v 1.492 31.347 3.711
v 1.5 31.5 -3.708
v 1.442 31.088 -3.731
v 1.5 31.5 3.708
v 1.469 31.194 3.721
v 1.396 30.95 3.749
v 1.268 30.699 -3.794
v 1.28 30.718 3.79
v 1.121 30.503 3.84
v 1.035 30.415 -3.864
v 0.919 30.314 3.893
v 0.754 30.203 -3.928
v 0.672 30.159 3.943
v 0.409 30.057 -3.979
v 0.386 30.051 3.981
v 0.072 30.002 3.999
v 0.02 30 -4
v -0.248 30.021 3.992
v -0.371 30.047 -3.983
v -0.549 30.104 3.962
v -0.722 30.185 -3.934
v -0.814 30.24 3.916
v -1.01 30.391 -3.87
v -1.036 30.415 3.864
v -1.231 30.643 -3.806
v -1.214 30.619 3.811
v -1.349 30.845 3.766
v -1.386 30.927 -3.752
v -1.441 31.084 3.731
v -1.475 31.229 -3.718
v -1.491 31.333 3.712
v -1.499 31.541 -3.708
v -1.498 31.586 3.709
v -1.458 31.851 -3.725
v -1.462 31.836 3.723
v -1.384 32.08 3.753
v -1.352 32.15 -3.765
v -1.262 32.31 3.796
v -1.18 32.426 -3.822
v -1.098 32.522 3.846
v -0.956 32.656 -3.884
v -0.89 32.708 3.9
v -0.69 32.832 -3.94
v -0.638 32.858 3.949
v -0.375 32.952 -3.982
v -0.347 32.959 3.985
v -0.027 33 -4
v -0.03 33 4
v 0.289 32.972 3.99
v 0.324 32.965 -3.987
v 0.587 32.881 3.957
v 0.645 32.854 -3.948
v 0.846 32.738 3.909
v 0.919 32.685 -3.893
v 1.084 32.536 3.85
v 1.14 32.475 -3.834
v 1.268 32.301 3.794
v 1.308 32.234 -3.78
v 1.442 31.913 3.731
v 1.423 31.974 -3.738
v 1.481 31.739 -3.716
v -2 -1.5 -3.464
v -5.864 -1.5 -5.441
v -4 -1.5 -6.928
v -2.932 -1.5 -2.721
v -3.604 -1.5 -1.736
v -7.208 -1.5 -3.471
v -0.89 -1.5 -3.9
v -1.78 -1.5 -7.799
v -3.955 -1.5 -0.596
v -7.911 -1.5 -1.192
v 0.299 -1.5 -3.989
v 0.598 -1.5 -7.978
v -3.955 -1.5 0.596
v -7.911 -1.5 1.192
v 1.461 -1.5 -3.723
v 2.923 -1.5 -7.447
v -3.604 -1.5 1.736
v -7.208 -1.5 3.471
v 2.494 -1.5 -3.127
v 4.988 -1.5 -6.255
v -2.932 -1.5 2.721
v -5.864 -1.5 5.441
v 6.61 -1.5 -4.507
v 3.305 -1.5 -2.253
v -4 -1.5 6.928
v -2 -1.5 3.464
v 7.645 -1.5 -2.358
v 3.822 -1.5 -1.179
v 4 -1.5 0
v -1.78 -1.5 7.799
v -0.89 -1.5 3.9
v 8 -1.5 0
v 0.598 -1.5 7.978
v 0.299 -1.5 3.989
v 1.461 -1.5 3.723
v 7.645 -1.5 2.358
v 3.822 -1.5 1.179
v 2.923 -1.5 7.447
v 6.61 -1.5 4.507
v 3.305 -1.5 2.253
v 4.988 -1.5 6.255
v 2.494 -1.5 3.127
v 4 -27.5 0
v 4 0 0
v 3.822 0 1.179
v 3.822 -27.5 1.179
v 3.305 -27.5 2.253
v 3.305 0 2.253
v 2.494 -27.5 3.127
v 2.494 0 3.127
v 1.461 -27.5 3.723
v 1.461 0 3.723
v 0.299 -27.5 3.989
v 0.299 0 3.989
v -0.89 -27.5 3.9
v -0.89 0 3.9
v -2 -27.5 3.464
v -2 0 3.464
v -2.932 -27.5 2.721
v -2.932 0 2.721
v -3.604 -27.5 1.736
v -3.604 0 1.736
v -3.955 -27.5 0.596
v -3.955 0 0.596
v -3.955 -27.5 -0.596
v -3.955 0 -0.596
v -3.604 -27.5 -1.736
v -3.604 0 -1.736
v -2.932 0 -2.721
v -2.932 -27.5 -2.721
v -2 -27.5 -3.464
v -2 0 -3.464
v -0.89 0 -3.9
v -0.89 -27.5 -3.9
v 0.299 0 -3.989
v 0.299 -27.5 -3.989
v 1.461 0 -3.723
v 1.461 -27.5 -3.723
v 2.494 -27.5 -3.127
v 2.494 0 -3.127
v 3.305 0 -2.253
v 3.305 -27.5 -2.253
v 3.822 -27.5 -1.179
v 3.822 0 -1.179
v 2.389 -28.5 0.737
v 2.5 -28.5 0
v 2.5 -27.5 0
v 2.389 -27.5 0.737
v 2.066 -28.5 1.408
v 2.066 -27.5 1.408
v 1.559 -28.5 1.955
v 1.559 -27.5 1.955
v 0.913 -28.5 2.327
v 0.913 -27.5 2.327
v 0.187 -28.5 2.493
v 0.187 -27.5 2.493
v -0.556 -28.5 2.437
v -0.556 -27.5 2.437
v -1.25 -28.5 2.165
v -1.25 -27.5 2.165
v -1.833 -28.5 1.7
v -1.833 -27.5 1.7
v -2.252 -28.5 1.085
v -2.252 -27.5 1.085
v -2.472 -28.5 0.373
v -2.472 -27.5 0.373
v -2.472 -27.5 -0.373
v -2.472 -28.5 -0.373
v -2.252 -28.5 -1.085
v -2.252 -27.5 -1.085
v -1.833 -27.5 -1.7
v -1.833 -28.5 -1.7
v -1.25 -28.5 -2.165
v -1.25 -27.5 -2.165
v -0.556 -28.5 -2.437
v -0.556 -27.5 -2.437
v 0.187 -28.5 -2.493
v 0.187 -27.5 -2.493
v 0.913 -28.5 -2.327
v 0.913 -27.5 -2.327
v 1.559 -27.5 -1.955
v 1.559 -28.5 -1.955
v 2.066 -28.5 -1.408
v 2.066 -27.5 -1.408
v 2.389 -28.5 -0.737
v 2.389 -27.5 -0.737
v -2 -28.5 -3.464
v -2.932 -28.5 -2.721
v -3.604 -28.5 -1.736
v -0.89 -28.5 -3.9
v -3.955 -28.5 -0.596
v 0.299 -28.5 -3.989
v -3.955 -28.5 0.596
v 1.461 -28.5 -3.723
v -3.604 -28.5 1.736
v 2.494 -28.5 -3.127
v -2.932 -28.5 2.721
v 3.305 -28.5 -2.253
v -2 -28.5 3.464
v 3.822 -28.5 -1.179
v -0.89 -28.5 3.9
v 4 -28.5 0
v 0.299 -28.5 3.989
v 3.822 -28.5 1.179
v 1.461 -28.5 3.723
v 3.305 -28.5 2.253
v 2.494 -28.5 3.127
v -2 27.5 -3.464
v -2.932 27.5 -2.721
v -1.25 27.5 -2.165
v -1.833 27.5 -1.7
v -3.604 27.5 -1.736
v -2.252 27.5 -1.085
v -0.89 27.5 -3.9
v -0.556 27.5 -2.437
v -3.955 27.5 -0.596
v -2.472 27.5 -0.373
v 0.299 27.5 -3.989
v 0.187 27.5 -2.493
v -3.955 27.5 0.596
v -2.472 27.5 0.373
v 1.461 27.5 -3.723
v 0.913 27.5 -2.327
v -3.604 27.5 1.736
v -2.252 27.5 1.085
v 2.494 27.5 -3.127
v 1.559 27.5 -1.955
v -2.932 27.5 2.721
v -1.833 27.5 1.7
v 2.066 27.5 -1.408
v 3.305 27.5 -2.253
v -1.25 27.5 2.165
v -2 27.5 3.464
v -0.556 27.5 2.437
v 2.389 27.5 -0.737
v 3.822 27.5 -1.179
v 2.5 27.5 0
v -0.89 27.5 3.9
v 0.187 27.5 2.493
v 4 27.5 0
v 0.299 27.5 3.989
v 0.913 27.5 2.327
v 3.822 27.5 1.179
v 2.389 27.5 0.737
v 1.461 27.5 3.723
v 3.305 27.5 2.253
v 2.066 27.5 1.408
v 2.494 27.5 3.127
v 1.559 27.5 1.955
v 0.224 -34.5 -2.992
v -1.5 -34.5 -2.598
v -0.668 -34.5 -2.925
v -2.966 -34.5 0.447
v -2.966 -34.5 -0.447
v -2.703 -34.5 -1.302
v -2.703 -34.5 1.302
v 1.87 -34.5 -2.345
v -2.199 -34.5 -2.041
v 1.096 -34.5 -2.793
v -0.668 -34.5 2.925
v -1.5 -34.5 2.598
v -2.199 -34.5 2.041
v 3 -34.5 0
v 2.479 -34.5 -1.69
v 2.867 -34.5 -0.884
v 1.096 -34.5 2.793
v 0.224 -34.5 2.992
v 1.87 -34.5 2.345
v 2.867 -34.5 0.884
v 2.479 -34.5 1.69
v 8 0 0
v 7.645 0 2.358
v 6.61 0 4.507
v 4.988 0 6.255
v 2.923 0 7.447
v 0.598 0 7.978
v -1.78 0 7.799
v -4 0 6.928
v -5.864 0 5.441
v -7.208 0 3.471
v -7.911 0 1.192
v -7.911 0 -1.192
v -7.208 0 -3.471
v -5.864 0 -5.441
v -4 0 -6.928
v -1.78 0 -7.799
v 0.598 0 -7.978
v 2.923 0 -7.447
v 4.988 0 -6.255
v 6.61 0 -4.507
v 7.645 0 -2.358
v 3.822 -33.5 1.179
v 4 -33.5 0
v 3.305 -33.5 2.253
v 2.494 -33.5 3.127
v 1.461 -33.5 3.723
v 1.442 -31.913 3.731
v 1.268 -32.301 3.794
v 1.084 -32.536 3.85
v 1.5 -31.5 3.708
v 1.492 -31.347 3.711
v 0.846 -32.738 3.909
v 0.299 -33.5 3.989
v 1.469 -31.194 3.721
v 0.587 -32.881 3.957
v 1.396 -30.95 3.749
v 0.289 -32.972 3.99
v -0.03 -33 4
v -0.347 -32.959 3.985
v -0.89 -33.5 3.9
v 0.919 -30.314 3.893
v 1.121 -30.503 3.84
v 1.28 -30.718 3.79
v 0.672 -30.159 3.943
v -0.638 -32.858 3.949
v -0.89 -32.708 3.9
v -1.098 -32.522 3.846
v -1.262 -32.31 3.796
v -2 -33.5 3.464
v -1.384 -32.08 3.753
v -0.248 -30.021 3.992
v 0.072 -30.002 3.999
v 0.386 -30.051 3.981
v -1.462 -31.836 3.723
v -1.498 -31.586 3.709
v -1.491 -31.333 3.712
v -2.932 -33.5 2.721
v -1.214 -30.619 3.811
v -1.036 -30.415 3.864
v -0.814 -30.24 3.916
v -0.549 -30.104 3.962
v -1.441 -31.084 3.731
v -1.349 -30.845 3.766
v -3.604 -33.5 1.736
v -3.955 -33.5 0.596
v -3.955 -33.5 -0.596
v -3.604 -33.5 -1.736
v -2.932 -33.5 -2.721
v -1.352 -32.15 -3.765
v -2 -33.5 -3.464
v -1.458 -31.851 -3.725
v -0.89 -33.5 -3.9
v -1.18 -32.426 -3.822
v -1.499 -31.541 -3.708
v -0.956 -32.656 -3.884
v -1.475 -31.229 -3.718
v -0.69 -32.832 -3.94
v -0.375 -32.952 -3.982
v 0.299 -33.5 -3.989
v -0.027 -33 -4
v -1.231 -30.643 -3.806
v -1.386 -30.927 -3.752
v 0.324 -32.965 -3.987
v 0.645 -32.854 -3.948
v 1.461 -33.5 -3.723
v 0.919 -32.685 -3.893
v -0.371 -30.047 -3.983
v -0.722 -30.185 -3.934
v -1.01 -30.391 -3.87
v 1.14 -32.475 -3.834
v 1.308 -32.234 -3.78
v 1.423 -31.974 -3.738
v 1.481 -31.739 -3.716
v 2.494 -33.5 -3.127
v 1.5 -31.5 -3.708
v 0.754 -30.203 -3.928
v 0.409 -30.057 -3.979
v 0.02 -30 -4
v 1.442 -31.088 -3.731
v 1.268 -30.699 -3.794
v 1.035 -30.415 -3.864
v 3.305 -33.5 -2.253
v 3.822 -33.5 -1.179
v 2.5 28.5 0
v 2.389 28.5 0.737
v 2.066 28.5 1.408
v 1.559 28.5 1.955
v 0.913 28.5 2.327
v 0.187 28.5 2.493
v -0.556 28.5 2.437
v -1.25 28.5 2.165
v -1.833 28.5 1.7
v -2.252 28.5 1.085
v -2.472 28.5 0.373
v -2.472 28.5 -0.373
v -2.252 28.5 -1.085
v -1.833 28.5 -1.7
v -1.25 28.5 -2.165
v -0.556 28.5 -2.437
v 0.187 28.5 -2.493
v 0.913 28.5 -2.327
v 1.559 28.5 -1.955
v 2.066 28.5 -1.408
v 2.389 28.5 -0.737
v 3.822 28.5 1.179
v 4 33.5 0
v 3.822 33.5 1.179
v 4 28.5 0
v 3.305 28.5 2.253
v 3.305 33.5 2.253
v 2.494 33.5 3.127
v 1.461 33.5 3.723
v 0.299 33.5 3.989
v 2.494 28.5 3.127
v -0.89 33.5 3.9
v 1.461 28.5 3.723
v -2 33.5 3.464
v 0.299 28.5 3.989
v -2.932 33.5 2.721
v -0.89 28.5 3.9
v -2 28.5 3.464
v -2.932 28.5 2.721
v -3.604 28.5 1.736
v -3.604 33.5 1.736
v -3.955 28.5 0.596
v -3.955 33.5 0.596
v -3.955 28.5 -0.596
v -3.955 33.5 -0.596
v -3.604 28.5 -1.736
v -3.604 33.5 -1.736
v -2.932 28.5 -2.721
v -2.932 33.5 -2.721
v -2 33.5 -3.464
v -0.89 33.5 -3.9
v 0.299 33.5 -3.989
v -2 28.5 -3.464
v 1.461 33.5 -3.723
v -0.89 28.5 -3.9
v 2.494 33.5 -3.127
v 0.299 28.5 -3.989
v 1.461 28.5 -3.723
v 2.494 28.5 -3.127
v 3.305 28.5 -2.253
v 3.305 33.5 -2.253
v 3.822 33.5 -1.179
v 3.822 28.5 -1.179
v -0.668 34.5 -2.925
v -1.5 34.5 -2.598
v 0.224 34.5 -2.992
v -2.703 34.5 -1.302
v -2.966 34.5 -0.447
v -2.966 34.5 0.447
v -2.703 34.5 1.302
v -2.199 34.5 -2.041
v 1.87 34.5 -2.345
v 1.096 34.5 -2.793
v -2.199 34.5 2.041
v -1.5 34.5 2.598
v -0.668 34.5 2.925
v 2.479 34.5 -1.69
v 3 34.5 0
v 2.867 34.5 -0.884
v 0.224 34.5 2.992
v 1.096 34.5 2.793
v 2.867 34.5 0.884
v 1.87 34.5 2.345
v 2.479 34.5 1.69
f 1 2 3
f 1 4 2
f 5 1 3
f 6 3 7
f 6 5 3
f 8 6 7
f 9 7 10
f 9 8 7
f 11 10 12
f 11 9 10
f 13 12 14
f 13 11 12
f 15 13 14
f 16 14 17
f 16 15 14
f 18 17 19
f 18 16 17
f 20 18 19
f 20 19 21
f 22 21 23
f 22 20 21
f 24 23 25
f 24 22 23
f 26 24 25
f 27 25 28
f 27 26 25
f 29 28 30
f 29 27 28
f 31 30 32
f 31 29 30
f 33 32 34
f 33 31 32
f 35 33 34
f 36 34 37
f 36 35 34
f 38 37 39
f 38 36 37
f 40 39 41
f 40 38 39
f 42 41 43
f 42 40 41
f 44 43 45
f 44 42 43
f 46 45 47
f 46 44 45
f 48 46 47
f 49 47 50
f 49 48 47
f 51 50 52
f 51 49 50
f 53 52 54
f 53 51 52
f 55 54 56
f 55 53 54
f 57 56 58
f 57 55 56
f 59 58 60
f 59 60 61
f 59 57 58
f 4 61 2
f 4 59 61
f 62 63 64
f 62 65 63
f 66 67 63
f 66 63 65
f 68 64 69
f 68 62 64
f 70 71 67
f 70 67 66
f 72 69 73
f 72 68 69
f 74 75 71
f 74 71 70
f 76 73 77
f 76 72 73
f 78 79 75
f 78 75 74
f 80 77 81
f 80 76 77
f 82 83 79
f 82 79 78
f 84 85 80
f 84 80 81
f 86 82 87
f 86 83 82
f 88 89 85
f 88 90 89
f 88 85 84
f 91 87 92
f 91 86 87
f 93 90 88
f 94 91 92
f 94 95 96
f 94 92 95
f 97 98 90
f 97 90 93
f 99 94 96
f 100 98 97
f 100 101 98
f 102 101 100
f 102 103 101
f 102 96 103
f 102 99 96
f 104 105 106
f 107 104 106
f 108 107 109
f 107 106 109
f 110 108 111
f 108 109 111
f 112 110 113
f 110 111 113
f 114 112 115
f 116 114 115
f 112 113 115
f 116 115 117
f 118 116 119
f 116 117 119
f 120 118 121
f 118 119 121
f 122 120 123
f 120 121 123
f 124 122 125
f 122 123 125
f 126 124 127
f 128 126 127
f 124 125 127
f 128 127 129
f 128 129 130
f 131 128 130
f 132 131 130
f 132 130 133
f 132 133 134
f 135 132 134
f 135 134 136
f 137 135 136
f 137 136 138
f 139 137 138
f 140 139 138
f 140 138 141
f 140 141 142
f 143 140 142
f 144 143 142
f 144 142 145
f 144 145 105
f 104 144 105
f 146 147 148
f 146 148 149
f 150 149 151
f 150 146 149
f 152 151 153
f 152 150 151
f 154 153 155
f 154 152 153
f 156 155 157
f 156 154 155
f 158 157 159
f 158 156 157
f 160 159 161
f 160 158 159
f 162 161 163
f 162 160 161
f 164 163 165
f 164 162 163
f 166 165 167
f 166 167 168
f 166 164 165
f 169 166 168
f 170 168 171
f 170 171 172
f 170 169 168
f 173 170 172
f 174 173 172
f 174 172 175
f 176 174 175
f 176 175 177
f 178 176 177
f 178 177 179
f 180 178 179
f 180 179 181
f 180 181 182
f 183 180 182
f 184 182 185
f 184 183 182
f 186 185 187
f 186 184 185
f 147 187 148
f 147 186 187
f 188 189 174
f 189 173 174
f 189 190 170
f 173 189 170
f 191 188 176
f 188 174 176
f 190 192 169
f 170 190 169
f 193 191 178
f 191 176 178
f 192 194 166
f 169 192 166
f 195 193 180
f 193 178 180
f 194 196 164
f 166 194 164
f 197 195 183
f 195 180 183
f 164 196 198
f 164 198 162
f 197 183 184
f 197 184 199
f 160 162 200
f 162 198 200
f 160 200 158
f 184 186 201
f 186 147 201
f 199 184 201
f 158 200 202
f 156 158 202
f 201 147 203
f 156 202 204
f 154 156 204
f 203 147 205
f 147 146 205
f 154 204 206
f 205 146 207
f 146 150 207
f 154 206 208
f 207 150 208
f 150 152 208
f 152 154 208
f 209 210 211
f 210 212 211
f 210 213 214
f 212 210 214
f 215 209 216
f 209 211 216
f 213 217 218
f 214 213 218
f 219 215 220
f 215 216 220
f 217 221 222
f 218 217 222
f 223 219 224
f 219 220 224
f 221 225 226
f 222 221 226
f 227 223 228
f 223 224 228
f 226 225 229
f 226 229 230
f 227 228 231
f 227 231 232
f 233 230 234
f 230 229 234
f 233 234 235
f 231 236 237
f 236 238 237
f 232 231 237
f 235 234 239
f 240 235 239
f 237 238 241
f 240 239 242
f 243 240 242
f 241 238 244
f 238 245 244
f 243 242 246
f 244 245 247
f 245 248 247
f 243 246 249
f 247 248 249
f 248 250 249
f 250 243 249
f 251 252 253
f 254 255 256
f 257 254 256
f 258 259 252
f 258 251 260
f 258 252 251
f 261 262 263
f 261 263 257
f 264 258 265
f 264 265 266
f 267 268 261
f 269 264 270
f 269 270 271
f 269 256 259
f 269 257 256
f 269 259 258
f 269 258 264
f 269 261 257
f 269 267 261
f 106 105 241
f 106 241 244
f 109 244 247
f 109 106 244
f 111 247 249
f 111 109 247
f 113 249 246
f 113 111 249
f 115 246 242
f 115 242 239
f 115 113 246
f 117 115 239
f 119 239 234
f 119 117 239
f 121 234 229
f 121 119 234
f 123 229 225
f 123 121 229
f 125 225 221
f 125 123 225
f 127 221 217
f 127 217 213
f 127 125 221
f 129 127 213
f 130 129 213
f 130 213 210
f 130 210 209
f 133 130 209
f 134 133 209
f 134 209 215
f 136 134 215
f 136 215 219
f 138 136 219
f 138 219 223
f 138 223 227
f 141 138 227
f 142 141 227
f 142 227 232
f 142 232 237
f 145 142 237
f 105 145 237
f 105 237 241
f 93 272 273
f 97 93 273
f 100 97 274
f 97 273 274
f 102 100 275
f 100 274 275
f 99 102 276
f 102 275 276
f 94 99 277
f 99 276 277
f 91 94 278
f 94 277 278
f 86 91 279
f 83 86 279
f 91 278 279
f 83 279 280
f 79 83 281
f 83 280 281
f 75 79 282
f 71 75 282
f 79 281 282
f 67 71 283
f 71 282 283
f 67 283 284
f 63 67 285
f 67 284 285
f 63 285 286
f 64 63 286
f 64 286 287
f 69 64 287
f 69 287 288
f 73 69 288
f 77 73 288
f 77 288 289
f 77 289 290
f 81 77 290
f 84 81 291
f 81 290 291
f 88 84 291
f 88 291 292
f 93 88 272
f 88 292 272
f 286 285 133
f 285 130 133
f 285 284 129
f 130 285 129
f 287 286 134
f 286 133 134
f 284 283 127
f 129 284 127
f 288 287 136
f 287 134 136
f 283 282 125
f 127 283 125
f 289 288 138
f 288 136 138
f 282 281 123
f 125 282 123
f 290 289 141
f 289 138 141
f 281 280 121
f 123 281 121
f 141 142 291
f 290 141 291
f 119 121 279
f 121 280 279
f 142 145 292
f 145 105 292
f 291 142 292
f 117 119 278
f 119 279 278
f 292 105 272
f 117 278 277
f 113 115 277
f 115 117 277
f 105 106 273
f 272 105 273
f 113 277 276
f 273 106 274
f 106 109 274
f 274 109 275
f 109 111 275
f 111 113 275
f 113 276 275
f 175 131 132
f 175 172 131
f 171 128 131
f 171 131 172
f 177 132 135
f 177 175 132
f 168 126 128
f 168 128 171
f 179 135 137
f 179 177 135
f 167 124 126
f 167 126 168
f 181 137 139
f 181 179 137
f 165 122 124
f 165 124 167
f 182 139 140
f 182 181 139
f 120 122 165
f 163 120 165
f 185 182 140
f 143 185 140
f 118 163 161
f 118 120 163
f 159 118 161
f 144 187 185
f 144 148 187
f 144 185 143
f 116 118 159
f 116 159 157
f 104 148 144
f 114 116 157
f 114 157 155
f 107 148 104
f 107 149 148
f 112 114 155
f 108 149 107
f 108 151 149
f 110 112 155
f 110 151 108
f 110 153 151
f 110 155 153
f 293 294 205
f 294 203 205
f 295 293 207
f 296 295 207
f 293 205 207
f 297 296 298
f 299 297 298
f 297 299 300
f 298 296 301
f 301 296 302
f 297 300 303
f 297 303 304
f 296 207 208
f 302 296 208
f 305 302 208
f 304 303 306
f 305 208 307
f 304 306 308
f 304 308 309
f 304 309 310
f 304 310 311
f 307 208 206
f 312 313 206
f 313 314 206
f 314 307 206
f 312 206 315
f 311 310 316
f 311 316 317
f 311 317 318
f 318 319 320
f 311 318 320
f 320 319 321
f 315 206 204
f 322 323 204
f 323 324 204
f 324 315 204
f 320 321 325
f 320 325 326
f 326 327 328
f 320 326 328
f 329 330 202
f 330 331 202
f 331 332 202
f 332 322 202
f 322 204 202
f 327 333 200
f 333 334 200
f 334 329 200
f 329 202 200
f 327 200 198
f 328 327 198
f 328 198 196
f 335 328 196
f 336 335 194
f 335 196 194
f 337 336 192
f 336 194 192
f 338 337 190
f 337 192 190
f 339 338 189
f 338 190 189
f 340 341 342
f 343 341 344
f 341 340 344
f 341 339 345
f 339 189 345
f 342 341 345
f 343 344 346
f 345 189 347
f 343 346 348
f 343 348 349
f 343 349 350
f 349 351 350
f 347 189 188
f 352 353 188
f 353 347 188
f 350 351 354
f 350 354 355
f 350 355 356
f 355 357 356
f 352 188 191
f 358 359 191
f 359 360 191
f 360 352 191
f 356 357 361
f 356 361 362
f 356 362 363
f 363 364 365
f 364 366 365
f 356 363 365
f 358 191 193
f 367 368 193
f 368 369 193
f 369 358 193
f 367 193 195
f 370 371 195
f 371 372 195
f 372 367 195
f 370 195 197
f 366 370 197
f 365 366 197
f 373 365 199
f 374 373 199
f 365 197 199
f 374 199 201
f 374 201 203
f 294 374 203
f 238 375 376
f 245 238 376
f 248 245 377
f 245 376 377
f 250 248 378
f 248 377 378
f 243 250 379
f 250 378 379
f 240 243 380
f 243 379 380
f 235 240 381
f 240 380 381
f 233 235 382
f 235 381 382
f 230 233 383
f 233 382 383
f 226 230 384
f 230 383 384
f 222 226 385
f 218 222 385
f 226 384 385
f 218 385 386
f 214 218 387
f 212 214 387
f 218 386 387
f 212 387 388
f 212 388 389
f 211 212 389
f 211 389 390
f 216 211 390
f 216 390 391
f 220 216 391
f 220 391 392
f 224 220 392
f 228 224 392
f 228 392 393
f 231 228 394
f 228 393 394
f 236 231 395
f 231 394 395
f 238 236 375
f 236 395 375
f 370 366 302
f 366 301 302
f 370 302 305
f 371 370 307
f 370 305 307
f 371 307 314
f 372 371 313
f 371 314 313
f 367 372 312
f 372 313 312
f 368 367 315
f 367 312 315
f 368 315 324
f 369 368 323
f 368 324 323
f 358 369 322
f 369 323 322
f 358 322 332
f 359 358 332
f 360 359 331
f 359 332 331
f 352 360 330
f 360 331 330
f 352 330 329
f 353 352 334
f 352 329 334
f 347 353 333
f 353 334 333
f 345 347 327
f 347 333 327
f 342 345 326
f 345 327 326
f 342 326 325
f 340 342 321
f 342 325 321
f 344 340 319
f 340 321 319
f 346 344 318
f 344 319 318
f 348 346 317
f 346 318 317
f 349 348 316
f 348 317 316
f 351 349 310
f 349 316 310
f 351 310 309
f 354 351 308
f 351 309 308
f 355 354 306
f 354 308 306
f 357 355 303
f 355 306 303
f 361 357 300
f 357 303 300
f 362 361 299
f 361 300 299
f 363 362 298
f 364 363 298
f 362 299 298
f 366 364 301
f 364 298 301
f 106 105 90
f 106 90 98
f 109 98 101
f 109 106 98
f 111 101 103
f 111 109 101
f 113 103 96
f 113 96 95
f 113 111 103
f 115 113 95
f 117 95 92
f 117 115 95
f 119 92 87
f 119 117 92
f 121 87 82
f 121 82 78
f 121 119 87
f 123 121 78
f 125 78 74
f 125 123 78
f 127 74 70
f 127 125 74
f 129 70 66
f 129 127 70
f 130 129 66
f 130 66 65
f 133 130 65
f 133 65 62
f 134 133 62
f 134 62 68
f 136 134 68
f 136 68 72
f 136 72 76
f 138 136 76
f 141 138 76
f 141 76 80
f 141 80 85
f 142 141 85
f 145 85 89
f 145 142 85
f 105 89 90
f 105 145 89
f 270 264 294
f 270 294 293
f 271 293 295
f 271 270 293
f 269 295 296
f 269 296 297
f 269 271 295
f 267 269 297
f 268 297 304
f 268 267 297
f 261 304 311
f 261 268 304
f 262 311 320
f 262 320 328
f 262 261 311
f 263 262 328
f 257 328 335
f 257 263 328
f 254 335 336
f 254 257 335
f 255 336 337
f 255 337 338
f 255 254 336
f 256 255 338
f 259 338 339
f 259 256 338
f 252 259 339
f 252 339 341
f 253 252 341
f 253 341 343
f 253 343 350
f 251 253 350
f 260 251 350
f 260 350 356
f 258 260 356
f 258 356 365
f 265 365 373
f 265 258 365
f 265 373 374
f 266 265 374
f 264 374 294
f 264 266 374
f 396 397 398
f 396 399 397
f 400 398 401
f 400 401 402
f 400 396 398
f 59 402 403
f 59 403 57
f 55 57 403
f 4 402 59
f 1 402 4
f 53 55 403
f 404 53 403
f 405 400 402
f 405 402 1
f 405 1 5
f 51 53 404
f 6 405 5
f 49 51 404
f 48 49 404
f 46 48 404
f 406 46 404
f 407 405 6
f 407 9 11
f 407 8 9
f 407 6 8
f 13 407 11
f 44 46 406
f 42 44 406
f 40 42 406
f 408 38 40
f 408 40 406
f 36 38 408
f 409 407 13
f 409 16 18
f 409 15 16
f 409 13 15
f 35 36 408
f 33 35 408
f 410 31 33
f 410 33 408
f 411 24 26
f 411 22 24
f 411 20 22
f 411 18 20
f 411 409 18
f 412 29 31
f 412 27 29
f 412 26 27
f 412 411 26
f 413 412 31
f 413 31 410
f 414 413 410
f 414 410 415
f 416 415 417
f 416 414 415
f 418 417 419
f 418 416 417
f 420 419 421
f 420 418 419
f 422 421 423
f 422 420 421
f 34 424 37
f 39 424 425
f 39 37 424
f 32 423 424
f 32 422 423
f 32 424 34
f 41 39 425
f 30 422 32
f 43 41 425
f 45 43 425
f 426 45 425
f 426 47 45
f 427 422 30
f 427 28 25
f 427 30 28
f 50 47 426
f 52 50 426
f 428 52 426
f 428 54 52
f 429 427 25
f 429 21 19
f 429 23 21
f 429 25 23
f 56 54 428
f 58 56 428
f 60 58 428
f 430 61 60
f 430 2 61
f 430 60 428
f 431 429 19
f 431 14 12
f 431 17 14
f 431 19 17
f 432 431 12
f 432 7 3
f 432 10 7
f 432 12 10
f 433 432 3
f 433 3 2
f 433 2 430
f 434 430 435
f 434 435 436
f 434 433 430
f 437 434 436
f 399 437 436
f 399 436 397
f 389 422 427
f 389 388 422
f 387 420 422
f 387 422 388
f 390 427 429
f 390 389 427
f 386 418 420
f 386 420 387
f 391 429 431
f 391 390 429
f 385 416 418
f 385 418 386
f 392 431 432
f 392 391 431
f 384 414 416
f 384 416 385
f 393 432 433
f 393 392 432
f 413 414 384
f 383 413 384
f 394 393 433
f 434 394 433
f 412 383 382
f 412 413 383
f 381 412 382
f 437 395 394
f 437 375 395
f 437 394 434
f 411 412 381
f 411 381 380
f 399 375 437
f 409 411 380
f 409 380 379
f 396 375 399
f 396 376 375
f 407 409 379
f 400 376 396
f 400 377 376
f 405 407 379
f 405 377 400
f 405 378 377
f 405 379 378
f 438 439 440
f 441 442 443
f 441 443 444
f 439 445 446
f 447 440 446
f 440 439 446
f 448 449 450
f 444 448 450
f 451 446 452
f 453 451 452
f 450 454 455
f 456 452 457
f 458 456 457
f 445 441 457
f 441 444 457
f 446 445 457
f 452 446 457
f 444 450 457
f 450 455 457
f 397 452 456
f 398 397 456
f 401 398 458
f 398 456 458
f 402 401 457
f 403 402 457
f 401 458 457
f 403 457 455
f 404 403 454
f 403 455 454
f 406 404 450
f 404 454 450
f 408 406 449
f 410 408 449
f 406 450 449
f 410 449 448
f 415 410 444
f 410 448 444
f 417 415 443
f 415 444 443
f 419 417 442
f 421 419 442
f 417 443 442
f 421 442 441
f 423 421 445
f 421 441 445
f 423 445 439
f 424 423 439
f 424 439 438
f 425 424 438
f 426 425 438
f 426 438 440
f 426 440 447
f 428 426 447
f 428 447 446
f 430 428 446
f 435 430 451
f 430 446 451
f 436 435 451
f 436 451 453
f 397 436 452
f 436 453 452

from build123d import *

# Parameters (mm, degrees)
F0_R     = 8
F0_R_2   = 4
F1_DEPTH = 1.5
F2_R     = 4
F3_DEPTH = 34.5
F5_R     = 4
F5_R_2   = 2.5
F6_DEPTH = 1
F7_SIZE  = 1
F8_R     = 1.5
F9_DEPTH = 4


with BuildPart() as f1:
    # F0 (on Front) → F1 (new body)
    with BuildSketch(Plane.XZ):
        Circle(F0_R)
        Circle(F0_R_2, mode=Mode.SUBTRACT)
    extrude(amount=F1_DEPTH)


with BuildPart() as f3:
    # F2 (on Front) → F3 (new body)
    with BuildSketch(Plane.XZ):
        Circle(F2_R)
    extrude(amount=F3_DEPTH)

    # F5 (on offset) → F6 (cut)
    with BuildSketch(Plane.XZ.offset(28.5)):
        Circle(F5_R)
        Circle(F5_R_2, mode=Mode.SUBTRACT)
    extrude(amount=-F6_DEPTH, mode=Mode.SUBTRACT)

    # F7
    f7_edges = [f3.edges().sort_by_distance(p)[0] for p in [
        (-4, -34.5, 0),
    ]]
    chamfer(f7_edges, length=F7_SIZE)

    # F8 (on Top) → F9 (cut, symmetric)
    with BuildSketch(Plane.XY):
        with Locations((0, -31.5)):
            Circle(F8_R)
    extrude(amount=F9_DEPTH, both=True, mode=Mode.SUBTRACT)

    # F10: F3 across plane


with BuildPart() as f3_1:
    add(f3.part)
    add(f3.part.mirror(Plane.XZ))


solid = Compound([f1.part, f3_1.part])
